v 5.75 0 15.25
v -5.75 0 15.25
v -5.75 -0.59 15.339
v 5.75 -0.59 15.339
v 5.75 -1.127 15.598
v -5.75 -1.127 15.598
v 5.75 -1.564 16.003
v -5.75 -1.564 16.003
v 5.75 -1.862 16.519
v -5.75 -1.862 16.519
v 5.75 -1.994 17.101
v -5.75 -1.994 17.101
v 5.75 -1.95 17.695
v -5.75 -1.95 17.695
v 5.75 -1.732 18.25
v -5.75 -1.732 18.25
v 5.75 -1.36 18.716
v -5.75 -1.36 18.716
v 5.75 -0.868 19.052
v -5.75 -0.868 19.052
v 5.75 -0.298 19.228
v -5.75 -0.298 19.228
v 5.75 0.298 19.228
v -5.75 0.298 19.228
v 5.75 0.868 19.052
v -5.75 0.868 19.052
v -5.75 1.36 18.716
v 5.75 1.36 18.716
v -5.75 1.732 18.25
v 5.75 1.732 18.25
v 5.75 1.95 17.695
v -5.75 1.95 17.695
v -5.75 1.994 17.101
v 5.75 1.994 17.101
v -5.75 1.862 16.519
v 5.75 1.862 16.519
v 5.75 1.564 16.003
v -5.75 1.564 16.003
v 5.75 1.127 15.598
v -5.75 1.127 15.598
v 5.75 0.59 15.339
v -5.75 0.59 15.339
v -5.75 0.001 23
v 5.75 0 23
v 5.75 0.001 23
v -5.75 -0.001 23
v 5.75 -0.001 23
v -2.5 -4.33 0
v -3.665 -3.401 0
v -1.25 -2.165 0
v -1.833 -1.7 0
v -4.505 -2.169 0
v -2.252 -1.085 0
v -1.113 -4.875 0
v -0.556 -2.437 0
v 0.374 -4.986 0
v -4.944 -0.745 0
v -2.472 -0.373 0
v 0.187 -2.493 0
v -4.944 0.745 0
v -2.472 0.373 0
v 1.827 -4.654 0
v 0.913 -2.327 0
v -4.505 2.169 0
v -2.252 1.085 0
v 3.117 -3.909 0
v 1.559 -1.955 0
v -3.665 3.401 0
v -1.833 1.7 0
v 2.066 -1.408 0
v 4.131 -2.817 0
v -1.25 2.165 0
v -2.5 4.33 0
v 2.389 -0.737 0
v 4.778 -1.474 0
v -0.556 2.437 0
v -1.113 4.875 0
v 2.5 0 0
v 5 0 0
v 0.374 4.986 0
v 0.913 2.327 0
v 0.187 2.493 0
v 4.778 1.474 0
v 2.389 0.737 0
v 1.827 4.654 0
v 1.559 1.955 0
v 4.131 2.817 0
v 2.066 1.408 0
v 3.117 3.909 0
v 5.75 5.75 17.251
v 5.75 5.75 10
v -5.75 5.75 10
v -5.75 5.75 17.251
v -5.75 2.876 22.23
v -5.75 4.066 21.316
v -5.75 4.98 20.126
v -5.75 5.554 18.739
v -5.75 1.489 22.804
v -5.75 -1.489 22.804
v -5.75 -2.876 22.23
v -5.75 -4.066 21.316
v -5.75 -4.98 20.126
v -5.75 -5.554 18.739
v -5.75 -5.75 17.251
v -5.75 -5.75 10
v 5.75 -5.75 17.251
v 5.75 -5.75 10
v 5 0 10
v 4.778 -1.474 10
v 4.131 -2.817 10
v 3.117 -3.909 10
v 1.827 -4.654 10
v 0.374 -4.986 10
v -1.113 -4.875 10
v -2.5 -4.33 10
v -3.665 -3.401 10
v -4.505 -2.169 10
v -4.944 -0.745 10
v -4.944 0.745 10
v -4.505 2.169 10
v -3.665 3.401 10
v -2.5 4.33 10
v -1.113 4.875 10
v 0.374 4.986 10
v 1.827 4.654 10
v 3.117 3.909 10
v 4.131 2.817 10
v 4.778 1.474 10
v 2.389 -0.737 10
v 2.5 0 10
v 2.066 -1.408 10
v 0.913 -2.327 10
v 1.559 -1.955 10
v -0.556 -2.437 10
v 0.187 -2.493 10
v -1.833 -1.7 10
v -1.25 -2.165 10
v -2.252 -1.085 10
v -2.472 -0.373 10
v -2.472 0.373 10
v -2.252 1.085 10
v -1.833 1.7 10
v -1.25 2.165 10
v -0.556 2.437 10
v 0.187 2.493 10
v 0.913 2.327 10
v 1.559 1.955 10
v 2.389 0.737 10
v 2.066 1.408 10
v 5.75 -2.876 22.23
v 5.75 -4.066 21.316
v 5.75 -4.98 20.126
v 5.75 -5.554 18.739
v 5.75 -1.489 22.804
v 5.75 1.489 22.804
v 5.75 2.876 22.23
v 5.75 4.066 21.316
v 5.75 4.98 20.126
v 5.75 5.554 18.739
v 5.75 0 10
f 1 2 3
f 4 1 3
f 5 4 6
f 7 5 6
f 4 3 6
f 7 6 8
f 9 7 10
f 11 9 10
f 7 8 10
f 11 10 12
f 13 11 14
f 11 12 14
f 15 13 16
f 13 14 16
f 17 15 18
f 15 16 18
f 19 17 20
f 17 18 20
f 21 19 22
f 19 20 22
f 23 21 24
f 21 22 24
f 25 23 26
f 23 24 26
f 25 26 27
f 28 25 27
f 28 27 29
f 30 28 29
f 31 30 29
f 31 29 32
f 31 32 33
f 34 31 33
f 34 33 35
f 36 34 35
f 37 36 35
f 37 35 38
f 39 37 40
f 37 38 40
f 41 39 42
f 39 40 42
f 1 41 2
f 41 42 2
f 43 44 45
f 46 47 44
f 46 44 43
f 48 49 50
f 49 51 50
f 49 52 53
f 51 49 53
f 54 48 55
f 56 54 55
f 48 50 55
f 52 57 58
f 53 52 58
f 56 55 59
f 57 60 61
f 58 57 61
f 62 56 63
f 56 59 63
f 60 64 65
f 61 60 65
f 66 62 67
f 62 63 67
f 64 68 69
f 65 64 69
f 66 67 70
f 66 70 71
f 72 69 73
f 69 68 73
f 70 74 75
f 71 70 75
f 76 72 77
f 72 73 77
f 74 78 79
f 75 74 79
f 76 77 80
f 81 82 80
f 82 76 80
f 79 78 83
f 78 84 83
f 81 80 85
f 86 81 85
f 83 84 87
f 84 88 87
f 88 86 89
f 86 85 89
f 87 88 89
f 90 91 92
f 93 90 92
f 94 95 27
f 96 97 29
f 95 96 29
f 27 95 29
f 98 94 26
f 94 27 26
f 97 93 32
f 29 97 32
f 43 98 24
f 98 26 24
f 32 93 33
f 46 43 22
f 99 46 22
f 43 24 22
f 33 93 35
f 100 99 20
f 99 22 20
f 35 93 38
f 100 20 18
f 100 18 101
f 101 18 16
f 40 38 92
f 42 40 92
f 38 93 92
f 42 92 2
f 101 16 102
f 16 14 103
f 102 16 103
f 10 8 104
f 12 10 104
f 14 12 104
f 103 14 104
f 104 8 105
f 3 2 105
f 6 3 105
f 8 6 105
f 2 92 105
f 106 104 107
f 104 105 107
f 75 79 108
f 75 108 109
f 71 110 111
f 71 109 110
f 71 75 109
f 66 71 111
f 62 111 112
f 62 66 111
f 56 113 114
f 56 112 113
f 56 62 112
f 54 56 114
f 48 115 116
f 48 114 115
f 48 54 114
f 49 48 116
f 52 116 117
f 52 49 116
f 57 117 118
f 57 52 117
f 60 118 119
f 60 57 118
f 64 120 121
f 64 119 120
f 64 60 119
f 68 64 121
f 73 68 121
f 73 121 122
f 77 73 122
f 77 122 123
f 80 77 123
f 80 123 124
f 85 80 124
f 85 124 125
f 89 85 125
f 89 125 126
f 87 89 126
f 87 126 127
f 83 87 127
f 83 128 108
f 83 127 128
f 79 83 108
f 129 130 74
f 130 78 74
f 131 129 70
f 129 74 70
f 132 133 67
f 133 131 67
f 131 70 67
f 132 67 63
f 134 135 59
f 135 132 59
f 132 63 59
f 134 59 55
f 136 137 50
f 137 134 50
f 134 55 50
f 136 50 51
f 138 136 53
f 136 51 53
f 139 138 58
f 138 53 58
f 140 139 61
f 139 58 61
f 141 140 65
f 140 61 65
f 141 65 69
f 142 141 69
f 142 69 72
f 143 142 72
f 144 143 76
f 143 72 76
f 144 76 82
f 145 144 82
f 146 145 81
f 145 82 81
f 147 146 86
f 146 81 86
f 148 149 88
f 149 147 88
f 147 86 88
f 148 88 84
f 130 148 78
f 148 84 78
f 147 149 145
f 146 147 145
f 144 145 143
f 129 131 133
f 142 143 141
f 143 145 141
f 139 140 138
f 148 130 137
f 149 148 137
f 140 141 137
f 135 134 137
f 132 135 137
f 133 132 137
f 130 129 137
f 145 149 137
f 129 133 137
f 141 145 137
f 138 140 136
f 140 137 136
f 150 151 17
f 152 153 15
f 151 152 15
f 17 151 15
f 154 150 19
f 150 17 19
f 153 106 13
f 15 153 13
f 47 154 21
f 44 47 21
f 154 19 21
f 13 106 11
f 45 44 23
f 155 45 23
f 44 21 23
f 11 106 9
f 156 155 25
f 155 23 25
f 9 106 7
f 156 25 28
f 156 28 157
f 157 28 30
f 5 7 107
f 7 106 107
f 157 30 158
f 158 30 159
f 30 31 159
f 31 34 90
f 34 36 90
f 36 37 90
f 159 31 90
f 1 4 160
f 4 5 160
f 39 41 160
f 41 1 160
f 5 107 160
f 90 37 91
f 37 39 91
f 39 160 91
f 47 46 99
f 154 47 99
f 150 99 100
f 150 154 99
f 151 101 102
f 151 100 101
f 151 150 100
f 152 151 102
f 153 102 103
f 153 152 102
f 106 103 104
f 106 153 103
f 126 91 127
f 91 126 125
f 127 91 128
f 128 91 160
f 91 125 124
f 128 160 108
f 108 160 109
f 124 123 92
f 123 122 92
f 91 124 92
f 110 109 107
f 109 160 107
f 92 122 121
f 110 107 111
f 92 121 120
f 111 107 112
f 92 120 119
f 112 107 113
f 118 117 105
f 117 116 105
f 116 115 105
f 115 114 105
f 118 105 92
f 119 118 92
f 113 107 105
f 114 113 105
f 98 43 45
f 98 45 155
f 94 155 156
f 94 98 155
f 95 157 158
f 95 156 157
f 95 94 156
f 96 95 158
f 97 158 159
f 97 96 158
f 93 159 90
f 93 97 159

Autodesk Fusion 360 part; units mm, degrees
sketch "Sketch1" plane through (0, 0, 0) normal (0, 0, 1) x (1, 0, 0)
  circle A0 centre (0, 0) radius 5
  circle A1 centre (0, 0) radius 2.5
  dimension "d1" = 10
  dimension "d2" = 5
extrude "Extrude1" add sketch "Sketch1" along normal blind 10
sketch "Sketch2" plane through (0, 0, 10) normal (0, 0, 1) x (-1, 0, 0)
  circle A0 centre (0, 0) radius 2.5
  circle A1 centre (0, 0) radius 5
  line L0 (0, 0) -> (-5.75, 0)
  line L1 (-5.75, 0) -> (-5.75, -5.75)
  line L2 (-5.75, -5.75) -> (5.75, -5.75)
  line L3 (5.75, -5.75) -> (5.75, 5.75)
  line L4 (5.75, 5.75) -> (-5.75, 5.75)
  line L5 (-5.75, 5.75) -> (-5.75, -5.75)
  dimension "d5" = 5.75
  dimension "d6" = 5.75
  dimension "d7" = 11.5
  dimension "d8" = 11.5
extrude "Extrude2" add sketch "Sketch2" along normal blind 13 contours A0 | A1 | L1 L2 L3 L4 L5
fillet "Fillet1" radius 5.75 2 edges at (0, -5.75, 23) (0, 5.75, 23)
hole "Hole1" at (5.75, 0, 17.25) direction (-1, 0, 0) diameter 4 depth 11.5 tip angle 180
equation "d5 = ( 11.5 / 2 ) * 1 mm"
